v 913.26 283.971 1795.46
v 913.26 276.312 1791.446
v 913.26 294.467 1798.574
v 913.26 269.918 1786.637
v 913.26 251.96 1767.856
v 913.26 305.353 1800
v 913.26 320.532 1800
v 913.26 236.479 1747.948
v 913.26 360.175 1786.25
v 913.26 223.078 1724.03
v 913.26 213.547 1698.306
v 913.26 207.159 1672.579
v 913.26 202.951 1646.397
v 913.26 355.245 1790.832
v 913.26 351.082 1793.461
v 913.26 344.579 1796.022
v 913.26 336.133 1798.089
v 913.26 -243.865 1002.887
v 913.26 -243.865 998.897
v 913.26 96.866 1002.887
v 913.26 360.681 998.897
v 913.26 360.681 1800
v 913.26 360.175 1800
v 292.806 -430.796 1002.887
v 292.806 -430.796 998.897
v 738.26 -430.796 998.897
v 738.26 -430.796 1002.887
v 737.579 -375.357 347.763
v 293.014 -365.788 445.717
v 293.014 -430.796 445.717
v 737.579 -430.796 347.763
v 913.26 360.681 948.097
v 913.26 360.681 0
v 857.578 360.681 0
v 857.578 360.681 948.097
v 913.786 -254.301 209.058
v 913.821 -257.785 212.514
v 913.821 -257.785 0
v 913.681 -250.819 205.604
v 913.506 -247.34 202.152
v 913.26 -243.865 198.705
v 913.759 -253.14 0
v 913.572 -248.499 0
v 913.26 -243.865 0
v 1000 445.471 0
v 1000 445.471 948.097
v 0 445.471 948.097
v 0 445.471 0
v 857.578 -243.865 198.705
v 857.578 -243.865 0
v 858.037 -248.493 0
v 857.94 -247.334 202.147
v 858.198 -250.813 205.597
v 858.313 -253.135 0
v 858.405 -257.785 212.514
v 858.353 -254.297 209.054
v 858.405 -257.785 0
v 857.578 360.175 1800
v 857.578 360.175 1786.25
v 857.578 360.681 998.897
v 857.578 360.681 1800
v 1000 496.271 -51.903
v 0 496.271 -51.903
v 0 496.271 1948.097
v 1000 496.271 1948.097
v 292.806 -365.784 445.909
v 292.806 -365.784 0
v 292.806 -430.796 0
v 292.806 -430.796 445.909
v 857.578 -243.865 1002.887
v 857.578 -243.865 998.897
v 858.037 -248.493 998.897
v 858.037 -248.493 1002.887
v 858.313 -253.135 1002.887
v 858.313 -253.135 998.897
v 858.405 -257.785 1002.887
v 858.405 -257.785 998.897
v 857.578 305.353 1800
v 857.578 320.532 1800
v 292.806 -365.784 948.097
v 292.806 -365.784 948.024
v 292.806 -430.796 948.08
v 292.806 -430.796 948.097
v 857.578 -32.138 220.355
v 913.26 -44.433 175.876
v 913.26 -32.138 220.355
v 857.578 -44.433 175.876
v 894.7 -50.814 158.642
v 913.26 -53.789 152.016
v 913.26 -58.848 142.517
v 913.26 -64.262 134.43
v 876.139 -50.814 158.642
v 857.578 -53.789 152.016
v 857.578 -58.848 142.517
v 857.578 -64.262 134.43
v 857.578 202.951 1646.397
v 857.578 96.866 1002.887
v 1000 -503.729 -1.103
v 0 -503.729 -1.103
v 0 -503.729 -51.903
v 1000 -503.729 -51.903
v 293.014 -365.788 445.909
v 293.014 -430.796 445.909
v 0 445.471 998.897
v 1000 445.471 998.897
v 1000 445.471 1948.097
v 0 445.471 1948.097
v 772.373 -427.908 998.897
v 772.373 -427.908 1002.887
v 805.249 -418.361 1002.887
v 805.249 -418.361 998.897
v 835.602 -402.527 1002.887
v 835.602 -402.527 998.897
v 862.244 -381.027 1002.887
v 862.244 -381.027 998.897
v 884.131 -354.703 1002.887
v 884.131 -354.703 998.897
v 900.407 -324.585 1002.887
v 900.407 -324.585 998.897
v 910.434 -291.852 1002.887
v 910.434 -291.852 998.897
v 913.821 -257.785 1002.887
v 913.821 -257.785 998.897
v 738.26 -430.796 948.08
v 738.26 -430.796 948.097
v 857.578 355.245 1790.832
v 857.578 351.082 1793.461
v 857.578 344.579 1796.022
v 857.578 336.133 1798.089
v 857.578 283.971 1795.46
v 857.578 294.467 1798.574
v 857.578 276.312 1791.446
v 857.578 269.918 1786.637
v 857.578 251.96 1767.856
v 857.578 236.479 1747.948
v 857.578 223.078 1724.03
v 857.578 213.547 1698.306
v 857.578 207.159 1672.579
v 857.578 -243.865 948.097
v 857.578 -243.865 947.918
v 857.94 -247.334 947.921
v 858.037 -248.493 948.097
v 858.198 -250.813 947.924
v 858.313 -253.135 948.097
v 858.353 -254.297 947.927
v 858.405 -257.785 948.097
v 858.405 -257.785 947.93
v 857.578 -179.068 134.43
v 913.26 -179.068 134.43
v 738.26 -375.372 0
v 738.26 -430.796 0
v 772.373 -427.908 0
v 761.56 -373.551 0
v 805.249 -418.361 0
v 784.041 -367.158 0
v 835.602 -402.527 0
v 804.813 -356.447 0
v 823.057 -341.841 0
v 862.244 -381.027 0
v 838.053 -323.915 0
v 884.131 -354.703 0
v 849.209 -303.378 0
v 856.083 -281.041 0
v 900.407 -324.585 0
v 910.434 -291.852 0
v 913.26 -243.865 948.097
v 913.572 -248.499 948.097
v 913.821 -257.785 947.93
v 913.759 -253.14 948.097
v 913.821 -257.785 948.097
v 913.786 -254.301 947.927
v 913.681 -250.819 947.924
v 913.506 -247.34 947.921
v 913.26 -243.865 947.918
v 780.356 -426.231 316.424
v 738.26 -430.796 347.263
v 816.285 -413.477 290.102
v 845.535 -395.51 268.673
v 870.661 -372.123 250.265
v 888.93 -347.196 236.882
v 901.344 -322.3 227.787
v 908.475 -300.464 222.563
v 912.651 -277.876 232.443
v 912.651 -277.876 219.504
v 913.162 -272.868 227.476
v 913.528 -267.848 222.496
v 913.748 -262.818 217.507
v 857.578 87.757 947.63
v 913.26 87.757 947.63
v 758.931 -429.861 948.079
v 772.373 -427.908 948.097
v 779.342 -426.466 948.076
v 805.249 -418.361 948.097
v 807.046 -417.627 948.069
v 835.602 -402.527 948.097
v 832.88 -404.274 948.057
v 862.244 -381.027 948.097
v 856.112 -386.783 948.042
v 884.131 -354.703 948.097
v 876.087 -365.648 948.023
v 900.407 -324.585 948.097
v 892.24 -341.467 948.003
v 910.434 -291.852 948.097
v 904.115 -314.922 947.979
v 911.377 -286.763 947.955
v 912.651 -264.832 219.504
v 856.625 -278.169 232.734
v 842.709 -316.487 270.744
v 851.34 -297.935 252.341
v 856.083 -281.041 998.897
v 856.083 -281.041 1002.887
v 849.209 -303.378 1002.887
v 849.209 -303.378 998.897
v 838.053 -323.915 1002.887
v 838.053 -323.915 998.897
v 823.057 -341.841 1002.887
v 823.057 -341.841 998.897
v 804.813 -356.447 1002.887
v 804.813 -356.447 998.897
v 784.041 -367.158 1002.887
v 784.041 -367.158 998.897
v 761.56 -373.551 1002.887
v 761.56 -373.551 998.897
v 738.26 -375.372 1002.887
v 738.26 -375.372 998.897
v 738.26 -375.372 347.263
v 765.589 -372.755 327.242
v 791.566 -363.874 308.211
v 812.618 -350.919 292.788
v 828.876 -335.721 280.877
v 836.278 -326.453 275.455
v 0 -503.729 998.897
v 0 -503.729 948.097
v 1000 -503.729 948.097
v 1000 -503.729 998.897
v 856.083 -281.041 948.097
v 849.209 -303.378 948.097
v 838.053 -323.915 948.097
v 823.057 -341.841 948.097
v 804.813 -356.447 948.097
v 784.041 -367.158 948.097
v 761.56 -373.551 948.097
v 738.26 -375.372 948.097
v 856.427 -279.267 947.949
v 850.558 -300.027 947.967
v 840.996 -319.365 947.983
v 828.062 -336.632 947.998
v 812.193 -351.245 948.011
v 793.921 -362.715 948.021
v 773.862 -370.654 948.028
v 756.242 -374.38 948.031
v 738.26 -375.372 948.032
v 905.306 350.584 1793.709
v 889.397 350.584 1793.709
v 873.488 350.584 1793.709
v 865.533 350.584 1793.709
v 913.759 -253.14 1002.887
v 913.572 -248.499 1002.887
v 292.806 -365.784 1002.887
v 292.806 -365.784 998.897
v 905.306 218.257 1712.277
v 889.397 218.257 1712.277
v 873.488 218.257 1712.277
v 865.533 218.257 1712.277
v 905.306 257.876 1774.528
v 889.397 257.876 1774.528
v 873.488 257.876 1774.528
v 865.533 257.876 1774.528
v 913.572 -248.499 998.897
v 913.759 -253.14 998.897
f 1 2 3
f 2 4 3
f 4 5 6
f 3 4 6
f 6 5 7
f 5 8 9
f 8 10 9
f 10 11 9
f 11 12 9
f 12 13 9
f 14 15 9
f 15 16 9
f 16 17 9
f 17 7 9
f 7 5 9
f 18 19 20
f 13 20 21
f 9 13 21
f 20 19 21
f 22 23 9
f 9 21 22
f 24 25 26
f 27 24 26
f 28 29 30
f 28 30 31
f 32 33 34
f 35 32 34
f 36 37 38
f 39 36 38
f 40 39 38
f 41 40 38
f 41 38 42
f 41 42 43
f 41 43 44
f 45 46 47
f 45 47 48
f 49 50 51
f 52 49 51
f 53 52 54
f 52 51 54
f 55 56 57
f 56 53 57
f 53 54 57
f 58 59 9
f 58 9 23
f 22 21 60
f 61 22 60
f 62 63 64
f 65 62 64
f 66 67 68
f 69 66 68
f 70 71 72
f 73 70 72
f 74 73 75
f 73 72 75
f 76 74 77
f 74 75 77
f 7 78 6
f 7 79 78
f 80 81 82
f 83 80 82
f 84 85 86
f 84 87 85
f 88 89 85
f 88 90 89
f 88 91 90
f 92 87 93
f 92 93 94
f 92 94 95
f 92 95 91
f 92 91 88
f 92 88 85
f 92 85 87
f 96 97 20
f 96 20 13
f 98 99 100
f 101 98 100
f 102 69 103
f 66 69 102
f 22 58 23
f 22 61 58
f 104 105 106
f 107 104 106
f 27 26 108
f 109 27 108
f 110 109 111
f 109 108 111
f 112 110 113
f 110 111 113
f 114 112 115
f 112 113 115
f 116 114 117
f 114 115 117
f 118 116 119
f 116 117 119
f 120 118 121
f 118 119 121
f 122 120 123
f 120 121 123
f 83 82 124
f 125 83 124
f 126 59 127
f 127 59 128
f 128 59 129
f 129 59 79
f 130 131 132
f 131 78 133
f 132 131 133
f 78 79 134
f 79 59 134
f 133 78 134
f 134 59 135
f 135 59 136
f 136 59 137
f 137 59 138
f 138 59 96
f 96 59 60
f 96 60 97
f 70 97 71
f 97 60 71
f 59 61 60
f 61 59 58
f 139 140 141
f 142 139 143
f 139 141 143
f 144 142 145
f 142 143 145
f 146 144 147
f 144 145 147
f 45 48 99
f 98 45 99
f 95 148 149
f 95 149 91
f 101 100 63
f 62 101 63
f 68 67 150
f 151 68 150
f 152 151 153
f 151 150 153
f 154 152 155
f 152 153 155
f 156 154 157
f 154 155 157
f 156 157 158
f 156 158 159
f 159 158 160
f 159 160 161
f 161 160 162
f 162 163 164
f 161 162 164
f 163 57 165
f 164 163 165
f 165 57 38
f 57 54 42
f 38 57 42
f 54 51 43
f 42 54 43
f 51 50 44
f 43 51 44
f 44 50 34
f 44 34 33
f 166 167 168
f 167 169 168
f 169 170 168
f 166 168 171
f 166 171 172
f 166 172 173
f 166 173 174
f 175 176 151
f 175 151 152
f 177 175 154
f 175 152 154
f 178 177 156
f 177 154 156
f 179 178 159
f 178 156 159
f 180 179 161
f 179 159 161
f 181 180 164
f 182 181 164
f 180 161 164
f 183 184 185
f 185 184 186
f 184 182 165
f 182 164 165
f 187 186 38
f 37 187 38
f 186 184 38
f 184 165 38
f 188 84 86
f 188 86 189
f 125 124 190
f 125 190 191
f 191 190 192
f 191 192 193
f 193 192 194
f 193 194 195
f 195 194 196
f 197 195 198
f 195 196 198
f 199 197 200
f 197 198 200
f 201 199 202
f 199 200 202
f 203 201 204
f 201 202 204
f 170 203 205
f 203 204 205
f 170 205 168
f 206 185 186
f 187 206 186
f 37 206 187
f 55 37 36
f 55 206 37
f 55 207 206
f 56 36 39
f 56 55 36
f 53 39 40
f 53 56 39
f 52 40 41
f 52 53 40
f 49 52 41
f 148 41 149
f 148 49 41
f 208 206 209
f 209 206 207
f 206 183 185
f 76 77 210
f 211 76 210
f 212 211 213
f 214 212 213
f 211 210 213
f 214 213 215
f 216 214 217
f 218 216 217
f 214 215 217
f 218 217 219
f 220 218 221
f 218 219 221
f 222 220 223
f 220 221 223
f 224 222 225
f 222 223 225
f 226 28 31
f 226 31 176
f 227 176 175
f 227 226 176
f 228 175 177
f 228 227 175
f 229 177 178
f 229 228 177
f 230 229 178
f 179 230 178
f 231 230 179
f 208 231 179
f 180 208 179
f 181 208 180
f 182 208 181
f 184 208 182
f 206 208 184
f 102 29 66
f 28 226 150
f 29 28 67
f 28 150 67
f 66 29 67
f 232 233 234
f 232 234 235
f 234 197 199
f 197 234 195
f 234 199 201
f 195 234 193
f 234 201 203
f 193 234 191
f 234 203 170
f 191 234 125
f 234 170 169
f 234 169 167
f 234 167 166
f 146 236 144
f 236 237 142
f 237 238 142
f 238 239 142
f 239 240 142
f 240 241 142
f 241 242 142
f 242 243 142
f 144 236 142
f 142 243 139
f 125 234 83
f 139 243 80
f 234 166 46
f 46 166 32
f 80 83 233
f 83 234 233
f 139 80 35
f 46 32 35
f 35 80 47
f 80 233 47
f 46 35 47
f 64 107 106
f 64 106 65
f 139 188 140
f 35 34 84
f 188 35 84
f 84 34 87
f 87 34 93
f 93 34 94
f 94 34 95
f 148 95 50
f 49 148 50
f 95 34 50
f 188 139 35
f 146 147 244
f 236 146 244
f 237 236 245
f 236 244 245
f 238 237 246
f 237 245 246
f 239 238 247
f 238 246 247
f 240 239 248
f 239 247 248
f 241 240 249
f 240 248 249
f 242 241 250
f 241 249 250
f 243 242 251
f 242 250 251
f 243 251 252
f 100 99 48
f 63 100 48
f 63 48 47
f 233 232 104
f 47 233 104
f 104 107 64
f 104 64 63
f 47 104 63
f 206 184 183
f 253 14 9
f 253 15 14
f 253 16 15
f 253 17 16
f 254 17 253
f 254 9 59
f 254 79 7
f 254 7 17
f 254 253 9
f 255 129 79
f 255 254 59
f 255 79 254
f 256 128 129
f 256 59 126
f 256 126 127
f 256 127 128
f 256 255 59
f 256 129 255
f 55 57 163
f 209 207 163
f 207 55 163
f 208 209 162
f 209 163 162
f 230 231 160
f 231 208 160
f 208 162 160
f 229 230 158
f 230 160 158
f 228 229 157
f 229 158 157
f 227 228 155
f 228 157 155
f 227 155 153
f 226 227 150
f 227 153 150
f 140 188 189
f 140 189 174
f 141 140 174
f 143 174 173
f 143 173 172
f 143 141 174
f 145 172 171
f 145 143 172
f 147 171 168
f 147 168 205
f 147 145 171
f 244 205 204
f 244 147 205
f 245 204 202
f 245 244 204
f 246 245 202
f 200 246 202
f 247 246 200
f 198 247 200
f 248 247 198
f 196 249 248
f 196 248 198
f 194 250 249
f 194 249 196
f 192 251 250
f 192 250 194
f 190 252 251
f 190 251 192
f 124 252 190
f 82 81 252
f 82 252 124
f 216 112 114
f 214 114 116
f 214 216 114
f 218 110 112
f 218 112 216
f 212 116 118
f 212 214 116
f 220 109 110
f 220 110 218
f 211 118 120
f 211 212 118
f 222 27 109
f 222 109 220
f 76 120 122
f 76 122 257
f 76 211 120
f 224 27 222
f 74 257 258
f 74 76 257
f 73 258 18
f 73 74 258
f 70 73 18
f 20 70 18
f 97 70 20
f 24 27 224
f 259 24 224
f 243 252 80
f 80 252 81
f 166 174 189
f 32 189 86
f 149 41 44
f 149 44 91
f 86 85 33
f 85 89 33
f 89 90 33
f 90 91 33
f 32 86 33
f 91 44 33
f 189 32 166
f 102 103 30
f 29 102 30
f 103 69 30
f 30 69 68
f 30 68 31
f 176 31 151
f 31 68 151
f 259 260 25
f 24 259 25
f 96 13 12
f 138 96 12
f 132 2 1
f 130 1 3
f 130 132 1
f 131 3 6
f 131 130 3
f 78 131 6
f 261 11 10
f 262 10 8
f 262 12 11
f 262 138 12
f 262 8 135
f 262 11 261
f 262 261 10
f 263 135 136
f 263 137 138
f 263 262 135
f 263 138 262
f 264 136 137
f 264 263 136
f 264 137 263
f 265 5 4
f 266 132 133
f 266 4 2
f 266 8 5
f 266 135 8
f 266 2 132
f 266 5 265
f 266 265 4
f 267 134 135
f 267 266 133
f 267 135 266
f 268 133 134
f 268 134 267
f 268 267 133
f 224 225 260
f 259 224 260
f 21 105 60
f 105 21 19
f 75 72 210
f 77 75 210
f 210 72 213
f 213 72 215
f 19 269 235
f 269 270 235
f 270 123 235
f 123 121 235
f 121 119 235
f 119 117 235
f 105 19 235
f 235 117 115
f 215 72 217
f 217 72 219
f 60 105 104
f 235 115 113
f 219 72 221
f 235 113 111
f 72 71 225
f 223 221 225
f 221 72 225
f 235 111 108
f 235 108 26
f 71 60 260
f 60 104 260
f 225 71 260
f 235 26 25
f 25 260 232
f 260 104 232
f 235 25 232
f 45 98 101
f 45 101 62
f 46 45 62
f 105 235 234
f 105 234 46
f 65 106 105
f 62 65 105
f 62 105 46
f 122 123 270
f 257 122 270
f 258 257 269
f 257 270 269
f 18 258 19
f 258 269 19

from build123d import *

# Parameters (mm, degrees)
F0_W     = 949.2
F0_H     = 50.8
F0_W_2   = 50.8
F0_H_2   = 949.2
F1_DEPTH = 1000
F3_DEPTH = 1800
F5_DEPTH = 5360
F7_START = 131
F7_DEPTH = 629


with BuildPart() as f1:
    # F0 (on Right) → F1 (new body)
    with BuildSketch(Plane.YZ):
        with Locations((-29.1286933511, 973.496588254)):
            Rectangle(F0_W, F0_H)
        with Locations((470.8713066489, 973.496588254)):
            Rectangle(F0_W_2, F0_H)
        with Locations((470.8713066489, 1473.496588254)):
            Rectangle(F0_W_2, F0_H_2)
        Polygon((-503.7286933511, -1.103411746), (-503.7286933511, -51.903411746), (496.2713066489, -51.903411746), (496.2713066489, 948.096588254), (445.4713066489, 948.096588254), (445.4713066489, 0), align=None)
    extrude(amount=F1_DEPTH)

    # F2 (on Top) → F3 (join)
    with BuildSketch(Plane.XY):
        with BuildLine():
            ThreePointArc((857.5784564018, -130.1132158098), (896.2008242629, -181.7113174116), (913.260281086, -243.8645660877))
            Line((913.260281086, -243.8645660877), (913.260281086, 360.6808781624))
            Line((913.260281086, 360.6808781624), (857.5784564018, 360.6808781624))
            Line((857.5784564018, 360.6808781624), (857.5784564018, -130.1132158098))
        make_face()
        with BuildLine():
            ThreePointArc((611.3790712788, -372.640659557), (668.6957081838, -415.0795417944), (738.2603287697, -430.7963848114))
            ThreePointArc((738.2603287697, -430.7963848114), (862.2437509886, -381.0271980017), (913.8211489182, -257.785025984))
            ThreePointArc((913.8211489182, -257.785025984), (913.6808751008, -250.8191488596), (913.260281086, -243.8645660877))
            ThreePointArc((913.260281086, -243.8645660877), (896.2008242629, -181.7113174116), (857.5784564018, -130.1132158098))
            Line((857.5784564018, -130.1132158098), (857.5784564018, -243.8645660877))
            ThreePointArc((857.5784564018, -243.8645660877), (858.1982990198, -250.8125329656), (858.4051557693, -257.785025984))
            ThreePointArc((858.4051557693, -257.785025984), (823.0571563331, -341.8406590918), (738.2603287697, -375.3716679713))
            Line((738.2603287697, -375.3716679713), (611.3790712788, -372.640659557))
        make_face()
        with BuildLine():
            Line((292.8057610989, -365.7836468832), (292.8057610989, -430.7963848114))
            Line((292.8057610989, -430.7963848114), (738.2603287697, -430.7963848114))
            ThreePointArc((738.2603287697, -430.7963848114), (668.6957081838, -415.0795417944), (611.3790712788, -372.640659557))
            Line((611.3790712788, -372.640659557), (292.8057610989, -365.7836468832))
        make_face()
    extrude(amount=F3_DEPTH)

    # F4 (on Right) → F5 (cut)
    with BuildSketch(Plane.YZ):
        with BuildLine():
            Line((-435.6626272202, 1808.1647157669), (-436.3610964974, 1002.8872649632))
            Line((-436.3610964974, 1002.8872649632), (96.866071558, 1002.8872649632))
            Line((96.866071558, 1002.8872649632), (202.9513269663, 1646.3969945908))
            add(Edge.make_bspline(
                [(202.9513269663, 1646.3969945908), (204.5801297554, 1657.9332047918), (208.2046485199, 1683.6043361435), (225.3759496446, 1736.6871062603), (256.9211367372, 1774.2470270708), (280.5041077395, 1798.206239093), (317.8181539373, 1801.9341732886), (350.8337600962, 1795.8752573669), (357.6071157247, 1788.8956994391), (360.1746559143, 1786.2499952316)],
                knots=[0, 0, 0, 0, 0.1468911817, 0.3268718889, 0.4960081367, 0.6320686272, 0.7781002106, 0.9158856173, 1, 1, 1, 1], degree=3))
            Line((360.1746559143, 1786.2499952316), (360.1746559143, 1808.1647157669))
            Line((360.1746559143, 1808.1647157669), (-435.6626272202, 1808.1647157669))
        make_face()
        with BuildLine():
            Line((-436.4086301738, 948.084857743), (-436.8441998959, 445.9089040756))
            Line((-436.8441998959, 445.9089040756), (-348.0192422867, 445.9089040756))
            Line((-348.0192422867, 445.9089040756), (-243.5122281313, 445.9089040756))
            Line((-243.5122281313, 445.9089040756), (-243.5122281313, 220.3548997641))
            add(Edge.make_bspline(
                [(-243.5122281313, 220.3548997641), (-233.785627989, 201.848121656), (-224.0590278467, 183.3413435479), (-211.8256313009, 166.9237262564)],
                knots=[0, 0, 0, 0, 0.1915955458, 0.1915955458, 0.1915955458, 0.1915955458], degree=3))
            Line((-211.8256313009, 166.9237262564), (-179.0682524443, 134.4295740128))
            Line((-179.0682524443, 134.4295740128), (-64.2616951351, 134.4295740128))
            add(Edge.make_bspline(
                [(-64.2616951351, 134.4295740128), (-48.6215669755, 155.0982523243), (-40.3796052607, 187.7265760442), (-32.1376435459, 220.3548997641)],
                knots=[0.7406470598, 0.7406470598, 0.7406470598, 0.7406470598, 1, 1, 1, 1], degree=3))
            Line((-32.1376435459, 220.3548997641), (87.7567170793, 947.630215196))
            Line((87.7567170793, 947.630215196), (-436.4086301738, 948.084857743))
        make_face()
        with BuildLine():
            Line((-243.5122281313, 445.9089040756), (-348.0192422867, 445.9089040756))
            Line((-348.0192422867, 445.9089040756), (-348.0192422867, 302.02293396))
            Line((-348.0192422867, 302.02293396), (-211.8256313009, 166.9237262564))
            add(Edge.make_bspline(
                [(-243.5122281313, 220.3548997641), (-233.785627989, 201.848121656), (-224.0590278467, 183.3413435479), (-211.8256313009, 166.9237262564)],
                knots=[0, 0, 0, 0, 0.1915955458, 0.1915955458, 0.1915955458, 0.1915955458], degree=3))
            Line((-243.5122281313, 220.3548997641), (-243.5122281313, 445.9089040756))
        make_face()
    extrude(amount=F5_DEPTH, mode=Mode.SUBTRACT)

    # F6 (on Front) → F7 (cut)
    with BuildSketch(Plane.XZ.offset(F7_START)):
        Polygon((293.0140197277, 459.7436785698), (293.0140197277, 445.7174837589), (737.5785708427, 347.7625846863), (912.6507639885, 219.5038050413), (912.6507639885, 459.7436785698), align=None)
    extrude(amount=F7_DEPTH, mode=Mode.SUBTRACT)


solid = f1.part
